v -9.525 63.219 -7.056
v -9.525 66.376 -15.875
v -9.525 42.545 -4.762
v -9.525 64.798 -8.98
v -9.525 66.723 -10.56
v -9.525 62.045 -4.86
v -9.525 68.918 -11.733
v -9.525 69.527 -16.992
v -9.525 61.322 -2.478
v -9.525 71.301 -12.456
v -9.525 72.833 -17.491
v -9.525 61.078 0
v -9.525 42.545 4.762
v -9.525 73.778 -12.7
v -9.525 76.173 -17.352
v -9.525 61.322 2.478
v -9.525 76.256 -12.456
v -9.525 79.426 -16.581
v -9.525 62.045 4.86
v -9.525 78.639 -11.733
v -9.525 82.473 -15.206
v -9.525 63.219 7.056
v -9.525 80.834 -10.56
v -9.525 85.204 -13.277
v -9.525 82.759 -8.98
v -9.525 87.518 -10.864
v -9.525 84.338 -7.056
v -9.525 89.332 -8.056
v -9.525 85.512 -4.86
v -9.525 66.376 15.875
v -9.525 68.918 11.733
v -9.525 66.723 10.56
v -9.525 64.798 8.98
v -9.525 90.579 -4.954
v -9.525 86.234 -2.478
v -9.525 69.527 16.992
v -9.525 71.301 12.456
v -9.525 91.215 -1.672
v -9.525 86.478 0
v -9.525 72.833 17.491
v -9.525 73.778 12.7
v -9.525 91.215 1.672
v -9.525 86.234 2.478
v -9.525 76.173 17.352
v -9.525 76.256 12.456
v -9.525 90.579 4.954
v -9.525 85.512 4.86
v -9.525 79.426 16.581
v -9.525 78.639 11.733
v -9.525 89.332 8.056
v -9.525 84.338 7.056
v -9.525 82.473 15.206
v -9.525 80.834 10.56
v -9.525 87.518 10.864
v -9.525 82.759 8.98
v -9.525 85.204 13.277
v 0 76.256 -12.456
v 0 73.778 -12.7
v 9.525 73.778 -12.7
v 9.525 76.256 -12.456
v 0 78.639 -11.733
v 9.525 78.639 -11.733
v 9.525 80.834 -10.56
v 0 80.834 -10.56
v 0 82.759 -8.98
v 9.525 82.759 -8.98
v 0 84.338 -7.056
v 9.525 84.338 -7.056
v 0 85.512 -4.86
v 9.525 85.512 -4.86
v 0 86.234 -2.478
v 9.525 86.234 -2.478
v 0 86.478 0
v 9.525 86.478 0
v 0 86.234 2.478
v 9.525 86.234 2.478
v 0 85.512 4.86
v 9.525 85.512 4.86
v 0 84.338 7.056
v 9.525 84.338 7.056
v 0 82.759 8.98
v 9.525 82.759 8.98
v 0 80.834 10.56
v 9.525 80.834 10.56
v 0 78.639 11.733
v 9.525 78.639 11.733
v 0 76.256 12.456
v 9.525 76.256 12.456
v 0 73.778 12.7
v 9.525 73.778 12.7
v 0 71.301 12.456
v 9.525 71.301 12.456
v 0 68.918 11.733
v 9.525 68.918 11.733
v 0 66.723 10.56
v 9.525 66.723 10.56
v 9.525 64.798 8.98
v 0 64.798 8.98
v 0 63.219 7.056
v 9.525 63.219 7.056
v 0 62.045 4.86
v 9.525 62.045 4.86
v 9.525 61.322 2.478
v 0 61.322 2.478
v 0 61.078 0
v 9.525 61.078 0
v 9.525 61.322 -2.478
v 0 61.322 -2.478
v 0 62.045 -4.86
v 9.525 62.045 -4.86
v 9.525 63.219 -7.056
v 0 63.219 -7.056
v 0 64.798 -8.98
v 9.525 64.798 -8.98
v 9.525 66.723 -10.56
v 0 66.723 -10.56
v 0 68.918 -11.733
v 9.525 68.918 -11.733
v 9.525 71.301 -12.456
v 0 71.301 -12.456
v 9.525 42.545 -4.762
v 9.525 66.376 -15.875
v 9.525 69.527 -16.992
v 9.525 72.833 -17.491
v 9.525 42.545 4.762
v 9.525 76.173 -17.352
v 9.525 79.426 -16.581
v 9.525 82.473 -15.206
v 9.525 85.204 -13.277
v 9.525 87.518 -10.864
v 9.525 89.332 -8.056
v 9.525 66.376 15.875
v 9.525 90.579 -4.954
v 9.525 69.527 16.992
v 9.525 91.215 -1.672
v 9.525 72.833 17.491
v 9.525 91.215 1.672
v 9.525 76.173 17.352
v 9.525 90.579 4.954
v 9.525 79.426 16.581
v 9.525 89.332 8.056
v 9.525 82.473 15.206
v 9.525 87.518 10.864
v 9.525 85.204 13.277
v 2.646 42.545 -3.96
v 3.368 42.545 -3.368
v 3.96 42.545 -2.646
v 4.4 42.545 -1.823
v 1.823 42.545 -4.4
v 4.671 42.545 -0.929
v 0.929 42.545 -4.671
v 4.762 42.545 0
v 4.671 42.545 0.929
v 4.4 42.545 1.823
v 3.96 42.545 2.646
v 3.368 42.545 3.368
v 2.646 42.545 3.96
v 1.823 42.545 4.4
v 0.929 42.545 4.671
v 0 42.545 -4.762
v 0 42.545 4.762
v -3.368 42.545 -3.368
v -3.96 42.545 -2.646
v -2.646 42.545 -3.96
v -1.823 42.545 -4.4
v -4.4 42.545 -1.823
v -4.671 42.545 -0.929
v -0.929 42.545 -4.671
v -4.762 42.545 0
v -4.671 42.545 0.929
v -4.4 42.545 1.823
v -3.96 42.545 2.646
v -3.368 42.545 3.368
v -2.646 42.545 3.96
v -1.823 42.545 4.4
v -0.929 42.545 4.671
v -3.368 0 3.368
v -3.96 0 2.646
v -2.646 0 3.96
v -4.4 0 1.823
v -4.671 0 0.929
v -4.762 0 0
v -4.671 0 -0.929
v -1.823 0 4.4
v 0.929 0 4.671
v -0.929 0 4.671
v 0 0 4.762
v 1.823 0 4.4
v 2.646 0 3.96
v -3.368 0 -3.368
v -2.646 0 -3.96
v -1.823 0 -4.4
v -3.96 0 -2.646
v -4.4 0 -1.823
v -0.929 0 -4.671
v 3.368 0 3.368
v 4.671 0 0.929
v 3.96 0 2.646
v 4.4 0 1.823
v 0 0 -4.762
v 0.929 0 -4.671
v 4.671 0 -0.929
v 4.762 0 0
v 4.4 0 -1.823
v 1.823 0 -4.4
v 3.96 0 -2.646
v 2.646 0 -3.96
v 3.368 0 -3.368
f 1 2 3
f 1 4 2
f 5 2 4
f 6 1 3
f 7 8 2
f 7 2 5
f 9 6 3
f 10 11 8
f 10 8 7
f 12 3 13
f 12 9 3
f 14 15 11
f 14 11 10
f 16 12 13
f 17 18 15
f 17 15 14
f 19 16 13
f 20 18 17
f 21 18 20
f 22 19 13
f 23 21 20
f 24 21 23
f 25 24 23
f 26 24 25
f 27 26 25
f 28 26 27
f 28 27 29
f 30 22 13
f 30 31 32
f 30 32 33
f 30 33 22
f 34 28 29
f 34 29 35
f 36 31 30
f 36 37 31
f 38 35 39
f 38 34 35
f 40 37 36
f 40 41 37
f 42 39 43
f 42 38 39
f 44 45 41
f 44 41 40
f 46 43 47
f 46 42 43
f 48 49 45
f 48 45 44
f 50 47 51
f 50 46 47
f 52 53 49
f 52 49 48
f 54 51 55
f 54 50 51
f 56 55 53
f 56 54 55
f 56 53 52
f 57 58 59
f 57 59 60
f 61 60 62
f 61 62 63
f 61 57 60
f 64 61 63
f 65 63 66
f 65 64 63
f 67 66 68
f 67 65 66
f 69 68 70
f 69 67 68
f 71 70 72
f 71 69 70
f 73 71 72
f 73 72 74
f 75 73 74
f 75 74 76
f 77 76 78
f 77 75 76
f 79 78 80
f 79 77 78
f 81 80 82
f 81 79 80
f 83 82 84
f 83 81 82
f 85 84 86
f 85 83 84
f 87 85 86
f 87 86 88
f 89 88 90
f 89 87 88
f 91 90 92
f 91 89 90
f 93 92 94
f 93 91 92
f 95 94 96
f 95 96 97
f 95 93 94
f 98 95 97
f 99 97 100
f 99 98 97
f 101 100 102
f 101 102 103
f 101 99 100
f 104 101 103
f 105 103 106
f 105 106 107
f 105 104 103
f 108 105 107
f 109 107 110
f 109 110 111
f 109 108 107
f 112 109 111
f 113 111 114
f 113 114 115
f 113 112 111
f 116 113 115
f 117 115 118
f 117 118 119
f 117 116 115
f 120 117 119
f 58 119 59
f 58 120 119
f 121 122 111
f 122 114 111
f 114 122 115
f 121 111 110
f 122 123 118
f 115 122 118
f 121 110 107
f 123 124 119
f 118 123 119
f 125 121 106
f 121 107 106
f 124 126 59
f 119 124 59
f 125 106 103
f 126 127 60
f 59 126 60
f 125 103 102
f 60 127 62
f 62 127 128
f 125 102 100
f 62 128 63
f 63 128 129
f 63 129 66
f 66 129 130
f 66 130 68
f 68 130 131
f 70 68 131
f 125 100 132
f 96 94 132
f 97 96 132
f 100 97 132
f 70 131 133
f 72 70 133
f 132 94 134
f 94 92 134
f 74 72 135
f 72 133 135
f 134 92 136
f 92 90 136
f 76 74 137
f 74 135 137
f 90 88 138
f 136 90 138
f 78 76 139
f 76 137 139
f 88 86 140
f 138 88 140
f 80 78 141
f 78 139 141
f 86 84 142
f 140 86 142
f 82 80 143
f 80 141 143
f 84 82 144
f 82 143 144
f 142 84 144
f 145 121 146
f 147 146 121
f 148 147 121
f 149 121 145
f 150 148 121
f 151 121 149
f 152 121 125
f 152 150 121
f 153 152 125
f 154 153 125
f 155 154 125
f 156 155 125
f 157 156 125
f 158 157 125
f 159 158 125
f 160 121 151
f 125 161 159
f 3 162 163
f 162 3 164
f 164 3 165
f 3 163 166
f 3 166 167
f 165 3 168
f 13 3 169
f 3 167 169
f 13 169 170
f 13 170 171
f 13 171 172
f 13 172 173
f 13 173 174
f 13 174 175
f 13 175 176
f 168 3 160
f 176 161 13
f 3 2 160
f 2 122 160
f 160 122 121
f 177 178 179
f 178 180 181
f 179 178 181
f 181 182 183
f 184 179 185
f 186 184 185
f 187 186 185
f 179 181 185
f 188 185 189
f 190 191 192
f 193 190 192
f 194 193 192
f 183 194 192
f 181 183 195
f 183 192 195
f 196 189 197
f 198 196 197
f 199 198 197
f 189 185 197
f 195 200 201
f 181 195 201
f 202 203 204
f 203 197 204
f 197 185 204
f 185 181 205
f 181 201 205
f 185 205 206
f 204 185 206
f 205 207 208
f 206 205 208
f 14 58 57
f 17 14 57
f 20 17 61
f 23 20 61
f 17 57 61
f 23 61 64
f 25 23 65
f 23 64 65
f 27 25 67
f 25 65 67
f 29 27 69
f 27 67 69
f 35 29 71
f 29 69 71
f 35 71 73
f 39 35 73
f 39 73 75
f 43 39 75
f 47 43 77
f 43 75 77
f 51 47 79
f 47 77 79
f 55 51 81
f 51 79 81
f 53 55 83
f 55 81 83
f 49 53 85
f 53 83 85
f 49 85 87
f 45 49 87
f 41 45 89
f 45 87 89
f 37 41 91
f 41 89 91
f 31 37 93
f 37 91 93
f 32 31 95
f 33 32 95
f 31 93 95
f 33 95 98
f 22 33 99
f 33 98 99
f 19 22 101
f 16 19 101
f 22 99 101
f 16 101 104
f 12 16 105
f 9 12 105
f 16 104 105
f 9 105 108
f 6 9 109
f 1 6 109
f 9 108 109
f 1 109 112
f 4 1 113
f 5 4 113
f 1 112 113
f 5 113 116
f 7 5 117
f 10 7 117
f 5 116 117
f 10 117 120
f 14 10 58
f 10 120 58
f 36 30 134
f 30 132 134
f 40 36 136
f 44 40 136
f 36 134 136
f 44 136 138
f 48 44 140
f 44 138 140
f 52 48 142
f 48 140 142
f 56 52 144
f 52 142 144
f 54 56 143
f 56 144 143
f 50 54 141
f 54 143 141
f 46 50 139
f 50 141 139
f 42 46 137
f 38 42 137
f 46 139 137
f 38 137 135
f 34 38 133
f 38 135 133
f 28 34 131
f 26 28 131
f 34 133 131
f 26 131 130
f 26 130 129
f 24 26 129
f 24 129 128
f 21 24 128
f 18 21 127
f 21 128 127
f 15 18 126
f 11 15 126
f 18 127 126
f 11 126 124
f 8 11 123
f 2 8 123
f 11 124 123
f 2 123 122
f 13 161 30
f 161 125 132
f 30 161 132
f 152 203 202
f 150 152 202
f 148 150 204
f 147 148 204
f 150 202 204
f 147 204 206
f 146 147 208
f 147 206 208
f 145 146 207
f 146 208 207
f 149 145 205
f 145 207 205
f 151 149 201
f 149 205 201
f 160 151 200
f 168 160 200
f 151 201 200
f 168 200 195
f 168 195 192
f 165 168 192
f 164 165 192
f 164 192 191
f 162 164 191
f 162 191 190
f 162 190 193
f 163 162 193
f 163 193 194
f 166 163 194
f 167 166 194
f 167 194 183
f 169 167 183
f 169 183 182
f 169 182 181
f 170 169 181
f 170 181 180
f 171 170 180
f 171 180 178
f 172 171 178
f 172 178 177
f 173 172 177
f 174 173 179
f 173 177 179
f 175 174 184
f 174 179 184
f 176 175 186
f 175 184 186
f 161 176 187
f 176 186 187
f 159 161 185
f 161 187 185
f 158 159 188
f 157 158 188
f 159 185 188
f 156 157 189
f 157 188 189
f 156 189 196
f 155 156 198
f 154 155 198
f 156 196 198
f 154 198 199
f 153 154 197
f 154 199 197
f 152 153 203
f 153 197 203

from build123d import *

# Parameters (mm, degrees)
SKETCH2_R                = 4.7625
BOSS_EXTRUDE1_DEPTH      = 42.545
BOSS_EXTRUDE2_DEPTH      = 9.525
BOSS_EXTRUDE2_DEPTH_BACK = 9.525
SKETCH3_R                = 12.7


with BuildPart() as part:
    # Sketch2 → Boss-Extrude1 (new body)
    with BuildSketch(Plane(origin=(0, 0, 0), x_dir=(1, 0, 0), z_dir=(0, 1, 0))):
        Circle(SKETCH2_R)
    extrude(amount=BOSS_EXTRUDE1_DEPTH)

    # Sketch3 → Boss-Extrude2 (add, two sides: drawn at the far end of the back side and taken through both)
    with BuildSketch(Plane(origin=(0, 0, 0), x_dir=(0, 0, -1), z_dir=(1, 0, 0)).offset(-BOSS_EXTRUDE2_DEPTH_BACK)):
        with BuildLine():
            Line((-4.7625, 42.545), (-15.875, 66.375833154))
            ThreePointArc((-15.875, 66.375833154), (0, 91.294591691), (15.875, 66.375833154))
            Line((15.875, 66.375833154), (4.7625, 42.545))
            Line((4.7625, 42.545), (-4.7625, 42.545))
        make_face()
        with Locations((0, 73.778467227)):
            Circle(SKETCH3_R, mode=Mode.SUBTRACT)
    extrude(amount=BOSS_EXTRUDE2_DEPTH + BOSS_EXTRUDE2_DEPTH_BACK)


solid = part.part
